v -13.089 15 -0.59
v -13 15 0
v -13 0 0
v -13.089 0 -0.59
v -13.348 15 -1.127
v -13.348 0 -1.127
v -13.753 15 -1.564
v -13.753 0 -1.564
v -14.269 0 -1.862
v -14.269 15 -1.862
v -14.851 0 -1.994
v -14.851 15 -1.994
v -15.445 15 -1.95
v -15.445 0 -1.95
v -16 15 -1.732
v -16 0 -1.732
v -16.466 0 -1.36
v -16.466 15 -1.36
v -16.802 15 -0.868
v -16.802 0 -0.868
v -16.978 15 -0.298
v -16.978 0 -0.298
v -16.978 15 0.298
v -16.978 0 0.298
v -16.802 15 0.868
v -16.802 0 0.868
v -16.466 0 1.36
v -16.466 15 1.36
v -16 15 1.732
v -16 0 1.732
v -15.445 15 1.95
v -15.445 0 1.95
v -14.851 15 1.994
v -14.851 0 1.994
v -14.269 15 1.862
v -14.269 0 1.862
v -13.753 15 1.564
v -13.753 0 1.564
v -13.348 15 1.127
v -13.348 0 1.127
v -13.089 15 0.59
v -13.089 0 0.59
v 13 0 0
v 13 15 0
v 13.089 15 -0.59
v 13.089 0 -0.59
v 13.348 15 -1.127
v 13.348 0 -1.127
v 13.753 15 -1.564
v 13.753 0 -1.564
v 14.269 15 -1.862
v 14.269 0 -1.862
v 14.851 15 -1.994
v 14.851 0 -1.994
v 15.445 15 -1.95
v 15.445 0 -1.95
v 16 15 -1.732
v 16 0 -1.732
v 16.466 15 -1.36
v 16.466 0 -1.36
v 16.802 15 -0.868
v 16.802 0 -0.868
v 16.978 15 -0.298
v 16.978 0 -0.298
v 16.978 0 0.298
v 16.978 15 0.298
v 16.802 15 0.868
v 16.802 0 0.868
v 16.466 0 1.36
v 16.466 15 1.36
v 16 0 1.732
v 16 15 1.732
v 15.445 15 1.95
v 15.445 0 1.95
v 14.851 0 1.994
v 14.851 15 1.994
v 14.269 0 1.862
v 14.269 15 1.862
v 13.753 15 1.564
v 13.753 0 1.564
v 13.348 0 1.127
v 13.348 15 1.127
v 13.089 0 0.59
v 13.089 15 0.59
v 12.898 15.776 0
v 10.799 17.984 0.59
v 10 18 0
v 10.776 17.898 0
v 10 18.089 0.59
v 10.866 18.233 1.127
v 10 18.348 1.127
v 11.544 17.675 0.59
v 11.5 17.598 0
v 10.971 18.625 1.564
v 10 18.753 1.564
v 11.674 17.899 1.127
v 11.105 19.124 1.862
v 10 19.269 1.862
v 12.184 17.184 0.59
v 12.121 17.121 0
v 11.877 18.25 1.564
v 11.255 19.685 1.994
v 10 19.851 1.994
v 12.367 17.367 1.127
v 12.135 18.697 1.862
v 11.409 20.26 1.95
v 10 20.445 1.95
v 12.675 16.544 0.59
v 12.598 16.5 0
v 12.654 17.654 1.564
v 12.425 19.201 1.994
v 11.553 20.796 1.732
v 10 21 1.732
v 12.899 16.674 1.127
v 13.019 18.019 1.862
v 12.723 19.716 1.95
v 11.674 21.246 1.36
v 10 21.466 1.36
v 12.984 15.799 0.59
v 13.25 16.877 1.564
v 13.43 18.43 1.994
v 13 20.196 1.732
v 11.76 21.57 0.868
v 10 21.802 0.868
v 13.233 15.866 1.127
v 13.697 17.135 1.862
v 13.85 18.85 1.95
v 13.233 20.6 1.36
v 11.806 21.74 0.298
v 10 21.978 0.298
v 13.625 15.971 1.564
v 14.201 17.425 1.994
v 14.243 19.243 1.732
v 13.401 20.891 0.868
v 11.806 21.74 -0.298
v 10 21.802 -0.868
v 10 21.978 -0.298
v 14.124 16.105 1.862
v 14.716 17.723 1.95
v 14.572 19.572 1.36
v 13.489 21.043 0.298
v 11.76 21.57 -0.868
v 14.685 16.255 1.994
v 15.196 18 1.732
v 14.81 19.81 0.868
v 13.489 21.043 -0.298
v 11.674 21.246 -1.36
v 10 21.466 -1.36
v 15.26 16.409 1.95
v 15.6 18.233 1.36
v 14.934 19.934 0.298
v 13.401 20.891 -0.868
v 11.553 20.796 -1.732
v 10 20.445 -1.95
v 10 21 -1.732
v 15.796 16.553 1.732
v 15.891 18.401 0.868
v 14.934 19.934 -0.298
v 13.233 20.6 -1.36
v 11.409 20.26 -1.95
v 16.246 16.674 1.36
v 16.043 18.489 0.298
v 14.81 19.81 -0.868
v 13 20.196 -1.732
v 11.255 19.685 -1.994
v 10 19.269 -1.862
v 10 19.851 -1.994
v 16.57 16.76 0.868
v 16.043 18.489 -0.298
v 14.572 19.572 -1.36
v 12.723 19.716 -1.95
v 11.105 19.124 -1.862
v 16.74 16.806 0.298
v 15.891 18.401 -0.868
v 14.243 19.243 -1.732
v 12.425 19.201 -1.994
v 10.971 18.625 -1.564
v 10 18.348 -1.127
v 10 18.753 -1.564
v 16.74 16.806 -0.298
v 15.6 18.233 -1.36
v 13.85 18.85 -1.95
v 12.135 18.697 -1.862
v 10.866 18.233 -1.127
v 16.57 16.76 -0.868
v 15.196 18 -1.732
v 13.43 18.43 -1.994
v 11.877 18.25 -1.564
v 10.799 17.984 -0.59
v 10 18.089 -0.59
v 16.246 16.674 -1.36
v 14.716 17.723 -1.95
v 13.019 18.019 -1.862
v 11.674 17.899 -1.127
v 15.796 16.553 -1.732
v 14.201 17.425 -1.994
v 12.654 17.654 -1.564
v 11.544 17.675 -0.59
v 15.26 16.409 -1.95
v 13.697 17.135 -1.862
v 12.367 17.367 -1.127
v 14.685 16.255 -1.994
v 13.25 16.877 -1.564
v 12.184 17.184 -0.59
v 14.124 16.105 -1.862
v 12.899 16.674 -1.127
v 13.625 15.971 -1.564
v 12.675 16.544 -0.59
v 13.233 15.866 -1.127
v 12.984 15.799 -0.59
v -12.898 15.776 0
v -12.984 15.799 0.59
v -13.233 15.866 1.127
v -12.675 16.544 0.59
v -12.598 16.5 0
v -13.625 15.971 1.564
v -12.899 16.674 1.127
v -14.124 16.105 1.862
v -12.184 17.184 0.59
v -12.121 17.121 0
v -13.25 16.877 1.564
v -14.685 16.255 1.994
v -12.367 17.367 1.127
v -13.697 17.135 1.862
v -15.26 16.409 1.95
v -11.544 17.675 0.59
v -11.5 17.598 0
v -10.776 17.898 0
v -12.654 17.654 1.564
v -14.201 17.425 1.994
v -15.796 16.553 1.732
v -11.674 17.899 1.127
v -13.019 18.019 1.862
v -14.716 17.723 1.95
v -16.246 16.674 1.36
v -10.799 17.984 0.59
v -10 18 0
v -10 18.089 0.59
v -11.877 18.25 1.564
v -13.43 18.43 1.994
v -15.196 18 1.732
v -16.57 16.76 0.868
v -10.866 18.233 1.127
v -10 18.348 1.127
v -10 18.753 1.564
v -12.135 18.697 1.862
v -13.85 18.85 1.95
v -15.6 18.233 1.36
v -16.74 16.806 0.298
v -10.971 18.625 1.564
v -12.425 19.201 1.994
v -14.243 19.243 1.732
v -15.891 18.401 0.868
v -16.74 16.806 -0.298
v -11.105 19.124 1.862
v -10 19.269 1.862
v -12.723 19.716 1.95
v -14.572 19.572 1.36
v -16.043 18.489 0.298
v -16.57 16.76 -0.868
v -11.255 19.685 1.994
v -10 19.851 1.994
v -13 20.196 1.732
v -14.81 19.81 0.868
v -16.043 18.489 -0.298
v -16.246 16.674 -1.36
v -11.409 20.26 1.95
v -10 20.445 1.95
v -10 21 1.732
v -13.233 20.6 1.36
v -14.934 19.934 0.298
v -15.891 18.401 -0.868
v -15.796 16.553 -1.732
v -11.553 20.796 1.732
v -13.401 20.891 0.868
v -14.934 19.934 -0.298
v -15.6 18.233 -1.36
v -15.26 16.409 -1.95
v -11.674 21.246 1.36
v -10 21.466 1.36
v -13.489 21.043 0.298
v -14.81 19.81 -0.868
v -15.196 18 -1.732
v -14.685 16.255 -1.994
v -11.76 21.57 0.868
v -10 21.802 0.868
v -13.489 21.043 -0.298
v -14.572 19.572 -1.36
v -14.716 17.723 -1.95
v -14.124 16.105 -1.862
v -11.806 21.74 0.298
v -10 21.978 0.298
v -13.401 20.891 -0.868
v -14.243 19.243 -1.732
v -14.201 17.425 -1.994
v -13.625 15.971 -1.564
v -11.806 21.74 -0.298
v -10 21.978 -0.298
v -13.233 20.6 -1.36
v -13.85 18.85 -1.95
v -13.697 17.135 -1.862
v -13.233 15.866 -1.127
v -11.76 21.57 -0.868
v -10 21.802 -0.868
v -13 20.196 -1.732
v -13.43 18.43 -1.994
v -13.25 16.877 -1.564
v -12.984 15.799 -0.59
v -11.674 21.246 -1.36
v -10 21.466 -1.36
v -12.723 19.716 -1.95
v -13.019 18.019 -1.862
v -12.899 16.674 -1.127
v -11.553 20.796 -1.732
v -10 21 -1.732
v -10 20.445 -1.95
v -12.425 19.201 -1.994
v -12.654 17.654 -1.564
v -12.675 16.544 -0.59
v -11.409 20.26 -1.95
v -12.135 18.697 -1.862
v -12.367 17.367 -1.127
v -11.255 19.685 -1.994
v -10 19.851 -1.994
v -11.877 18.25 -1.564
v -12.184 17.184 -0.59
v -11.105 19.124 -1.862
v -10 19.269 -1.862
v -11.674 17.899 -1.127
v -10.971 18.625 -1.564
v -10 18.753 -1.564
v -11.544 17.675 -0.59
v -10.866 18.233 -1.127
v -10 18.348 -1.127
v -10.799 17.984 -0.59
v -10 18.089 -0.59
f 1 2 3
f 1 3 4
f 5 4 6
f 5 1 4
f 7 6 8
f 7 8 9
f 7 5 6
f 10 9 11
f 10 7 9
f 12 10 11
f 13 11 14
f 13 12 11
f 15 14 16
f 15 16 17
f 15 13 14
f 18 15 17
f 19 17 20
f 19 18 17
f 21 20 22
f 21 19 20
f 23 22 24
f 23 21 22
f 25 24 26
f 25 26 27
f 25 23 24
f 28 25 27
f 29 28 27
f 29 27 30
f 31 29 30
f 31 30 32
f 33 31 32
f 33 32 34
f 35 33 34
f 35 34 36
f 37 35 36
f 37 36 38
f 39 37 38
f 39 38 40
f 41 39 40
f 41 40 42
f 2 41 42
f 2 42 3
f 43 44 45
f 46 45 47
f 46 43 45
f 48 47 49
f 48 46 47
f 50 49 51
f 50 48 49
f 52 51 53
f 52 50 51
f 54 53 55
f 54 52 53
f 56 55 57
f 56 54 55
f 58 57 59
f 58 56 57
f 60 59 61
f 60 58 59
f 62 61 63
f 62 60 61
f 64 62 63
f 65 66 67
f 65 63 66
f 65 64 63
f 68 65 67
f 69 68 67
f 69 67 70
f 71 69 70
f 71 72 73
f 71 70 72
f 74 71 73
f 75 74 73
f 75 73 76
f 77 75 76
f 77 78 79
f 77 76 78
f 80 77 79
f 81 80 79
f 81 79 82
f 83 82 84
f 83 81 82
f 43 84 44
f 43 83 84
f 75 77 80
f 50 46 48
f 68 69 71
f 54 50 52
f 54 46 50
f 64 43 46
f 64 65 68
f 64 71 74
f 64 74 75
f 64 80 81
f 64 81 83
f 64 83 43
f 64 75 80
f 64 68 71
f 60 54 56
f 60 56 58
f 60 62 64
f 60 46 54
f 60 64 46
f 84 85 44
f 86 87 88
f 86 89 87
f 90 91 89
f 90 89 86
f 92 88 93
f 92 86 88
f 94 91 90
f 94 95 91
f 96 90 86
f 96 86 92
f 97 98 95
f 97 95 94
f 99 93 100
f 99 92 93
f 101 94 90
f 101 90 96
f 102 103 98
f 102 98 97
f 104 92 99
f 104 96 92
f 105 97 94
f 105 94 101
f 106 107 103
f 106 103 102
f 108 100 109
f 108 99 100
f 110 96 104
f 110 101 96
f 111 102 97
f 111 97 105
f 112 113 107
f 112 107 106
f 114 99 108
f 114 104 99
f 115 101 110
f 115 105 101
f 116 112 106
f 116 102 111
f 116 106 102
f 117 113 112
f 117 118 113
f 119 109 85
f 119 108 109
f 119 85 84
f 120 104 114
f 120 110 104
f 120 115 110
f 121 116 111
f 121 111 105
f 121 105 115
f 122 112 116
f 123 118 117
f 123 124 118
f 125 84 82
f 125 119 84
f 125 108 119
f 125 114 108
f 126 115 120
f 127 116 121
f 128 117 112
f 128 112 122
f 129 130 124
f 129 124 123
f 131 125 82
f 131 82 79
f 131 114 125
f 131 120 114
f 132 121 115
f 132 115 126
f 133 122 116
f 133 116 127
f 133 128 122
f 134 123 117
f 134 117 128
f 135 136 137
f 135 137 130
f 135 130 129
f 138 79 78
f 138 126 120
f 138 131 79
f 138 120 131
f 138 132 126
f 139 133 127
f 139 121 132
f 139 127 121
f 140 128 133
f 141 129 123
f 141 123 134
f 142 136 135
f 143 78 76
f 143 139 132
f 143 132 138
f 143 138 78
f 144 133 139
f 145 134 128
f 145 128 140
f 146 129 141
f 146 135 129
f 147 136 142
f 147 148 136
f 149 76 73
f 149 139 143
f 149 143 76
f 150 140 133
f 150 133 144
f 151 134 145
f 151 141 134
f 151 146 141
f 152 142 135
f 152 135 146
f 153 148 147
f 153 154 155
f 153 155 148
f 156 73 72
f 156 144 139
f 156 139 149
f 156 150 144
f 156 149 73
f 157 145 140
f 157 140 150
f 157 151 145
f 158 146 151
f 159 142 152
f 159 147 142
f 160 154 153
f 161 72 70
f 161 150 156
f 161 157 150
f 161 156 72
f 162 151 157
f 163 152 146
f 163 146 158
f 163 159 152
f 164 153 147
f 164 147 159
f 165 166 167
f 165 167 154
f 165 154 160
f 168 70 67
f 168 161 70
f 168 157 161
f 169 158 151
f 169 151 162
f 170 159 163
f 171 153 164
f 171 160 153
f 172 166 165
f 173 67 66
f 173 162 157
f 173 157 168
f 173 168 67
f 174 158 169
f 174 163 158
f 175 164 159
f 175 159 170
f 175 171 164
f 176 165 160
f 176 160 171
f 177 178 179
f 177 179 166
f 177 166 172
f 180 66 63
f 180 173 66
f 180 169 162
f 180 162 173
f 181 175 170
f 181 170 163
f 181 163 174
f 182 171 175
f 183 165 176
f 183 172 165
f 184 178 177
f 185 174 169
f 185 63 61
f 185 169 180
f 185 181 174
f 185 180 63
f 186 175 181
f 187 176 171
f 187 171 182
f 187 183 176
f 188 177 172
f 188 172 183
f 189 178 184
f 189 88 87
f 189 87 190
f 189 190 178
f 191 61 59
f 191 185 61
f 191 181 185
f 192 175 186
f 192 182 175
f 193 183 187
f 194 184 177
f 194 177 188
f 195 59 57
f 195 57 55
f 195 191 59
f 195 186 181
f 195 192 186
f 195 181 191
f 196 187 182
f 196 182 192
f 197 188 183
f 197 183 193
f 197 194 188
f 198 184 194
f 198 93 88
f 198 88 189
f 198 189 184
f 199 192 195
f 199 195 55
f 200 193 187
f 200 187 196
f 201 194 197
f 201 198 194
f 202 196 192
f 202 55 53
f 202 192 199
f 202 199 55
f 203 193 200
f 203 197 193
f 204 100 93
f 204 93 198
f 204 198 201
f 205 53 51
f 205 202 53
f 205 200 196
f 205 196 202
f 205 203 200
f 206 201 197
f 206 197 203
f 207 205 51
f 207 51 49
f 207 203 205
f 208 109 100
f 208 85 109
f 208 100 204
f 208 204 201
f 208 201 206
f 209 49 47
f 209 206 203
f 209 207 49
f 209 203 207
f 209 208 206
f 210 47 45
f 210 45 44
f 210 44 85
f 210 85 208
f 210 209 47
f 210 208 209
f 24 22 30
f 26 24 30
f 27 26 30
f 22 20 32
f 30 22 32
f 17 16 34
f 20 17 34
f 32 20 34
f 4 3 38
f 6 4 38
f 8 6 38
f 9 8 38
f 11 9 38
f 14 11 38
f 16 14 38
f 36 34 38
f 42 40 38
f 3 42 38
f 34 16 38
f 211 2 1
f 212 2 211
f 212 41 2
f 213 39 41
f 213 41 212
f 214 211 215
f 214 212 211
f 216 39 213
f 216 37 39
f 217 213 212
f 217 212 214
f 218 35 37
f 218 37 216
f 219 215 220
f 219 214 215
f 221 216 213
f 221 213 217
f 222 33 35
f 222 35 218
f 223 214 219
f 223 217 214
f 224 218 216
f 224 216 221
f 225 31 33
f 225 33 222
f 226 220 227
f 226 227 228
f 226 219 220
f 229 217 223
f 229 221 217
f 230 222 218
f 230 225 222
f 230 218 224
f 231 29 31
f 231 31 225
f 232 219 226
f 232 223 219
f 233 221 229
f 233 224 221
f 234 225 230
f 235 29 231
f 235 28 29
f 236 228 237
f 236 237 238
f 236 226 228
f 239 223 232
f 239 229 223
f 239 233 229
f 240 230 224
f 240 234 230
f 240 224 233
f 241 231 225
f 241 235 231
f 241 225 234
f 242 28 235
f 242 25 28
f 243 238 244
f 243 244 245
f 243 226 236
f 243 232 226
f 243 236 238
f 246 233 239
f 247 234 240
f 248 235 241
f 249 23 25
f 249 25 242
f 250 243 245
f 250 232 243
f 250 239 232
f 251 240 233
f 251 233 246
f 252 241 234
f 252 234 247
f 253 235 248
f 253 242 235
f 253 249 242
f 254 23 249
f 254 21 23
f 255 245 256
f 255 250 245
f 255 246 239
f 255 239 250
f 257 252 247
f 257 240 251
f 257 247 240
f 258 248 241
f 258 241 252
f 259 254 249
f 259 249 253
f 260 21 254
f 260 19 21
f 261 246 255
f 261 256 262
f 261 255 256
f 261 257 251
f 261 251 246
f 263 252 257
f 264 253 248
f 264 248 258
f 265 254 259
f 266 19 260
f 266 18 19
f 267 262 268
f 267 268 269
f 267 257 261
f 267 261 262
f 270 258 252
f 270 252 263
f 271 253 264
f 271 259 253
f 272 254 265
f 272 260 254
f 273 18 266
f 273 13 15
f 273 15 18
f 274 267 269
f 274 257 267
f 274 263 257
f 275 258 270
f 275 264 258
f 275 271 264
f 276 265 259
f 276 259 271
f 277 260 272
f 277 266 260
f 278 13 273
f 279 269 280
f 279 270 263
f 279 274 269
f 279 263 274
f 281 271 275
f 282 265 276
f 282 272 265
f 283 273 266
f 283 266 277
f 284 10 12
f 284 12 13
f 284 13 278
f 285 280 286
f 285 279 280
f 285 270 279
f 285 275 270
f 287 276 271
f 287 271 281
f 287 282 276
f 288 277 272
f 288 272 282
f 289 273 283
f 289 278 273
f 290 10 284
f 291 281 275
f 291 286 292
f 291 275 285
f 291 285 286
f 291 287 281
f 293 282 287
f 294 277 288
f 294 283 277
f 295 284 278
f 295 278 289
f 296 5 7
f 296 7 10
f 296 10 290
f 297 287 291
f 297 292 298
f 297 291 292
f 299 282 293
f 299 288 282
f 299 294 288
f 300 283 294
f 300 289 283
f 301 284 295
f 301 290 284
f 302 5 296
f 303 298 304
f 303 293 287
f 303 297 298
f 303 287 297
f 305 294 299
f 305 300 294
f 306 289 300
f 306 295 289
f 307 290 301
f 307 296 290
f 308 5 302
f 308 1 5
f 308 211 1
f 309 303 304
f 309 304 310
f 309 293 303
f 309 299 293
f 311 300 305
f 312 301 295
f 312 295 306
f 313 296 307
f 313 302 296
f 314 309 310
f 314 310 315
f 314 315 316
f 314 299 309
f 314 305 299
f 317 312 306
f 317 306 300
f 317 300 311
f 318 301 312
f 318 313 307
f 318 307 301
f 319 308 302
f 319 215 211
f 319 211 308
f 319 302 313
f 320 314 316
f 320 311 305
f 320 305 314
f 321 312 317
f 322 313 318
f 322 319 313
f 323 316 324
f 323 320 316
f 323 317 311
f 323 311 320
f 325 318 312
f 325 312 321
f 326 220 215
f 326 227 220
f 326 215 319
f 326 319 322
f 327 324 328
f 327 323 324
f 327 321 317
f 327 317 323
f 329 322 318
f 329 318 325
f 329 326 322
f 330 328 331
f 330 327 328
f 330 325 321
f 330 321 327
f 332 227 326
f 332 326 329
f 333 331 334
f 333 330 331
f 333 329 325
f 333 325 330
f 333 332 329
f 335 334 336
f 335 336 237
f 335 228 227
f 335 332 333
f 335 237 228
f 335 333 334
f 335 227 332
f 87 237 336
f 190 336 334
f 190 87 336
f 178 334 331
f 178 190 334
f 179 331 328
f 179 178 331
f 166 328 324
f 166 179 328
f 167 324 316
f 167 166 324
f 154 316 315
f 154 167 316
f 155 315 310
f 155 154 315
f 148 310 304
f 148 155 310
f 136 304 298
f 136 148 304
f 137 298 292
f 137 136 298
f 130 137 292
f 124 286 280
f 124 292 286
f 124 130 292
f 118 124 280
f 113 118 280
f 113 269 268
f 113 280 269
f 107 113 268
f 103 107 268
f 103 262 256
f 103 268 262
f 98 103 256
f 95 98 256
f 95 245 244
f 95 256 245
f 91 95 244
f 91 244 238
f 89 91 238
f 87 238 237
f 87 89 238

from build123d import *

# Parameters (mm, degrees)
CROQUIS2_R = 2


with BuildPart() as part:
    # Barrer1: sweep along a path in Croquis1
    with BuildLine(Plane.XY) as barrer1_path:
        Line((-15, 0), (-15, 15))
        ThreePointArc((-15, 15), (-13.535533906, 18.535533906), (-10, 20))
        Line((-10, 20), (10, 20))
        ThreePointArc((10, 20), (13.535533906, 18.535533906), (15, 15))
        Line((15, 15), (15, 0))
    # Croquis2 → Barrer1 (sweep)
    with BuildSketch(Plane(origin=(0, 0, 0), x_dir=(1, 0, 0), z_dir=(0, 1, 0))):
        with Locations((-15, 0)):
            Circle(CROQUIS2_R)
    sweep(path=barrer1_path.line)


solid = part.part
